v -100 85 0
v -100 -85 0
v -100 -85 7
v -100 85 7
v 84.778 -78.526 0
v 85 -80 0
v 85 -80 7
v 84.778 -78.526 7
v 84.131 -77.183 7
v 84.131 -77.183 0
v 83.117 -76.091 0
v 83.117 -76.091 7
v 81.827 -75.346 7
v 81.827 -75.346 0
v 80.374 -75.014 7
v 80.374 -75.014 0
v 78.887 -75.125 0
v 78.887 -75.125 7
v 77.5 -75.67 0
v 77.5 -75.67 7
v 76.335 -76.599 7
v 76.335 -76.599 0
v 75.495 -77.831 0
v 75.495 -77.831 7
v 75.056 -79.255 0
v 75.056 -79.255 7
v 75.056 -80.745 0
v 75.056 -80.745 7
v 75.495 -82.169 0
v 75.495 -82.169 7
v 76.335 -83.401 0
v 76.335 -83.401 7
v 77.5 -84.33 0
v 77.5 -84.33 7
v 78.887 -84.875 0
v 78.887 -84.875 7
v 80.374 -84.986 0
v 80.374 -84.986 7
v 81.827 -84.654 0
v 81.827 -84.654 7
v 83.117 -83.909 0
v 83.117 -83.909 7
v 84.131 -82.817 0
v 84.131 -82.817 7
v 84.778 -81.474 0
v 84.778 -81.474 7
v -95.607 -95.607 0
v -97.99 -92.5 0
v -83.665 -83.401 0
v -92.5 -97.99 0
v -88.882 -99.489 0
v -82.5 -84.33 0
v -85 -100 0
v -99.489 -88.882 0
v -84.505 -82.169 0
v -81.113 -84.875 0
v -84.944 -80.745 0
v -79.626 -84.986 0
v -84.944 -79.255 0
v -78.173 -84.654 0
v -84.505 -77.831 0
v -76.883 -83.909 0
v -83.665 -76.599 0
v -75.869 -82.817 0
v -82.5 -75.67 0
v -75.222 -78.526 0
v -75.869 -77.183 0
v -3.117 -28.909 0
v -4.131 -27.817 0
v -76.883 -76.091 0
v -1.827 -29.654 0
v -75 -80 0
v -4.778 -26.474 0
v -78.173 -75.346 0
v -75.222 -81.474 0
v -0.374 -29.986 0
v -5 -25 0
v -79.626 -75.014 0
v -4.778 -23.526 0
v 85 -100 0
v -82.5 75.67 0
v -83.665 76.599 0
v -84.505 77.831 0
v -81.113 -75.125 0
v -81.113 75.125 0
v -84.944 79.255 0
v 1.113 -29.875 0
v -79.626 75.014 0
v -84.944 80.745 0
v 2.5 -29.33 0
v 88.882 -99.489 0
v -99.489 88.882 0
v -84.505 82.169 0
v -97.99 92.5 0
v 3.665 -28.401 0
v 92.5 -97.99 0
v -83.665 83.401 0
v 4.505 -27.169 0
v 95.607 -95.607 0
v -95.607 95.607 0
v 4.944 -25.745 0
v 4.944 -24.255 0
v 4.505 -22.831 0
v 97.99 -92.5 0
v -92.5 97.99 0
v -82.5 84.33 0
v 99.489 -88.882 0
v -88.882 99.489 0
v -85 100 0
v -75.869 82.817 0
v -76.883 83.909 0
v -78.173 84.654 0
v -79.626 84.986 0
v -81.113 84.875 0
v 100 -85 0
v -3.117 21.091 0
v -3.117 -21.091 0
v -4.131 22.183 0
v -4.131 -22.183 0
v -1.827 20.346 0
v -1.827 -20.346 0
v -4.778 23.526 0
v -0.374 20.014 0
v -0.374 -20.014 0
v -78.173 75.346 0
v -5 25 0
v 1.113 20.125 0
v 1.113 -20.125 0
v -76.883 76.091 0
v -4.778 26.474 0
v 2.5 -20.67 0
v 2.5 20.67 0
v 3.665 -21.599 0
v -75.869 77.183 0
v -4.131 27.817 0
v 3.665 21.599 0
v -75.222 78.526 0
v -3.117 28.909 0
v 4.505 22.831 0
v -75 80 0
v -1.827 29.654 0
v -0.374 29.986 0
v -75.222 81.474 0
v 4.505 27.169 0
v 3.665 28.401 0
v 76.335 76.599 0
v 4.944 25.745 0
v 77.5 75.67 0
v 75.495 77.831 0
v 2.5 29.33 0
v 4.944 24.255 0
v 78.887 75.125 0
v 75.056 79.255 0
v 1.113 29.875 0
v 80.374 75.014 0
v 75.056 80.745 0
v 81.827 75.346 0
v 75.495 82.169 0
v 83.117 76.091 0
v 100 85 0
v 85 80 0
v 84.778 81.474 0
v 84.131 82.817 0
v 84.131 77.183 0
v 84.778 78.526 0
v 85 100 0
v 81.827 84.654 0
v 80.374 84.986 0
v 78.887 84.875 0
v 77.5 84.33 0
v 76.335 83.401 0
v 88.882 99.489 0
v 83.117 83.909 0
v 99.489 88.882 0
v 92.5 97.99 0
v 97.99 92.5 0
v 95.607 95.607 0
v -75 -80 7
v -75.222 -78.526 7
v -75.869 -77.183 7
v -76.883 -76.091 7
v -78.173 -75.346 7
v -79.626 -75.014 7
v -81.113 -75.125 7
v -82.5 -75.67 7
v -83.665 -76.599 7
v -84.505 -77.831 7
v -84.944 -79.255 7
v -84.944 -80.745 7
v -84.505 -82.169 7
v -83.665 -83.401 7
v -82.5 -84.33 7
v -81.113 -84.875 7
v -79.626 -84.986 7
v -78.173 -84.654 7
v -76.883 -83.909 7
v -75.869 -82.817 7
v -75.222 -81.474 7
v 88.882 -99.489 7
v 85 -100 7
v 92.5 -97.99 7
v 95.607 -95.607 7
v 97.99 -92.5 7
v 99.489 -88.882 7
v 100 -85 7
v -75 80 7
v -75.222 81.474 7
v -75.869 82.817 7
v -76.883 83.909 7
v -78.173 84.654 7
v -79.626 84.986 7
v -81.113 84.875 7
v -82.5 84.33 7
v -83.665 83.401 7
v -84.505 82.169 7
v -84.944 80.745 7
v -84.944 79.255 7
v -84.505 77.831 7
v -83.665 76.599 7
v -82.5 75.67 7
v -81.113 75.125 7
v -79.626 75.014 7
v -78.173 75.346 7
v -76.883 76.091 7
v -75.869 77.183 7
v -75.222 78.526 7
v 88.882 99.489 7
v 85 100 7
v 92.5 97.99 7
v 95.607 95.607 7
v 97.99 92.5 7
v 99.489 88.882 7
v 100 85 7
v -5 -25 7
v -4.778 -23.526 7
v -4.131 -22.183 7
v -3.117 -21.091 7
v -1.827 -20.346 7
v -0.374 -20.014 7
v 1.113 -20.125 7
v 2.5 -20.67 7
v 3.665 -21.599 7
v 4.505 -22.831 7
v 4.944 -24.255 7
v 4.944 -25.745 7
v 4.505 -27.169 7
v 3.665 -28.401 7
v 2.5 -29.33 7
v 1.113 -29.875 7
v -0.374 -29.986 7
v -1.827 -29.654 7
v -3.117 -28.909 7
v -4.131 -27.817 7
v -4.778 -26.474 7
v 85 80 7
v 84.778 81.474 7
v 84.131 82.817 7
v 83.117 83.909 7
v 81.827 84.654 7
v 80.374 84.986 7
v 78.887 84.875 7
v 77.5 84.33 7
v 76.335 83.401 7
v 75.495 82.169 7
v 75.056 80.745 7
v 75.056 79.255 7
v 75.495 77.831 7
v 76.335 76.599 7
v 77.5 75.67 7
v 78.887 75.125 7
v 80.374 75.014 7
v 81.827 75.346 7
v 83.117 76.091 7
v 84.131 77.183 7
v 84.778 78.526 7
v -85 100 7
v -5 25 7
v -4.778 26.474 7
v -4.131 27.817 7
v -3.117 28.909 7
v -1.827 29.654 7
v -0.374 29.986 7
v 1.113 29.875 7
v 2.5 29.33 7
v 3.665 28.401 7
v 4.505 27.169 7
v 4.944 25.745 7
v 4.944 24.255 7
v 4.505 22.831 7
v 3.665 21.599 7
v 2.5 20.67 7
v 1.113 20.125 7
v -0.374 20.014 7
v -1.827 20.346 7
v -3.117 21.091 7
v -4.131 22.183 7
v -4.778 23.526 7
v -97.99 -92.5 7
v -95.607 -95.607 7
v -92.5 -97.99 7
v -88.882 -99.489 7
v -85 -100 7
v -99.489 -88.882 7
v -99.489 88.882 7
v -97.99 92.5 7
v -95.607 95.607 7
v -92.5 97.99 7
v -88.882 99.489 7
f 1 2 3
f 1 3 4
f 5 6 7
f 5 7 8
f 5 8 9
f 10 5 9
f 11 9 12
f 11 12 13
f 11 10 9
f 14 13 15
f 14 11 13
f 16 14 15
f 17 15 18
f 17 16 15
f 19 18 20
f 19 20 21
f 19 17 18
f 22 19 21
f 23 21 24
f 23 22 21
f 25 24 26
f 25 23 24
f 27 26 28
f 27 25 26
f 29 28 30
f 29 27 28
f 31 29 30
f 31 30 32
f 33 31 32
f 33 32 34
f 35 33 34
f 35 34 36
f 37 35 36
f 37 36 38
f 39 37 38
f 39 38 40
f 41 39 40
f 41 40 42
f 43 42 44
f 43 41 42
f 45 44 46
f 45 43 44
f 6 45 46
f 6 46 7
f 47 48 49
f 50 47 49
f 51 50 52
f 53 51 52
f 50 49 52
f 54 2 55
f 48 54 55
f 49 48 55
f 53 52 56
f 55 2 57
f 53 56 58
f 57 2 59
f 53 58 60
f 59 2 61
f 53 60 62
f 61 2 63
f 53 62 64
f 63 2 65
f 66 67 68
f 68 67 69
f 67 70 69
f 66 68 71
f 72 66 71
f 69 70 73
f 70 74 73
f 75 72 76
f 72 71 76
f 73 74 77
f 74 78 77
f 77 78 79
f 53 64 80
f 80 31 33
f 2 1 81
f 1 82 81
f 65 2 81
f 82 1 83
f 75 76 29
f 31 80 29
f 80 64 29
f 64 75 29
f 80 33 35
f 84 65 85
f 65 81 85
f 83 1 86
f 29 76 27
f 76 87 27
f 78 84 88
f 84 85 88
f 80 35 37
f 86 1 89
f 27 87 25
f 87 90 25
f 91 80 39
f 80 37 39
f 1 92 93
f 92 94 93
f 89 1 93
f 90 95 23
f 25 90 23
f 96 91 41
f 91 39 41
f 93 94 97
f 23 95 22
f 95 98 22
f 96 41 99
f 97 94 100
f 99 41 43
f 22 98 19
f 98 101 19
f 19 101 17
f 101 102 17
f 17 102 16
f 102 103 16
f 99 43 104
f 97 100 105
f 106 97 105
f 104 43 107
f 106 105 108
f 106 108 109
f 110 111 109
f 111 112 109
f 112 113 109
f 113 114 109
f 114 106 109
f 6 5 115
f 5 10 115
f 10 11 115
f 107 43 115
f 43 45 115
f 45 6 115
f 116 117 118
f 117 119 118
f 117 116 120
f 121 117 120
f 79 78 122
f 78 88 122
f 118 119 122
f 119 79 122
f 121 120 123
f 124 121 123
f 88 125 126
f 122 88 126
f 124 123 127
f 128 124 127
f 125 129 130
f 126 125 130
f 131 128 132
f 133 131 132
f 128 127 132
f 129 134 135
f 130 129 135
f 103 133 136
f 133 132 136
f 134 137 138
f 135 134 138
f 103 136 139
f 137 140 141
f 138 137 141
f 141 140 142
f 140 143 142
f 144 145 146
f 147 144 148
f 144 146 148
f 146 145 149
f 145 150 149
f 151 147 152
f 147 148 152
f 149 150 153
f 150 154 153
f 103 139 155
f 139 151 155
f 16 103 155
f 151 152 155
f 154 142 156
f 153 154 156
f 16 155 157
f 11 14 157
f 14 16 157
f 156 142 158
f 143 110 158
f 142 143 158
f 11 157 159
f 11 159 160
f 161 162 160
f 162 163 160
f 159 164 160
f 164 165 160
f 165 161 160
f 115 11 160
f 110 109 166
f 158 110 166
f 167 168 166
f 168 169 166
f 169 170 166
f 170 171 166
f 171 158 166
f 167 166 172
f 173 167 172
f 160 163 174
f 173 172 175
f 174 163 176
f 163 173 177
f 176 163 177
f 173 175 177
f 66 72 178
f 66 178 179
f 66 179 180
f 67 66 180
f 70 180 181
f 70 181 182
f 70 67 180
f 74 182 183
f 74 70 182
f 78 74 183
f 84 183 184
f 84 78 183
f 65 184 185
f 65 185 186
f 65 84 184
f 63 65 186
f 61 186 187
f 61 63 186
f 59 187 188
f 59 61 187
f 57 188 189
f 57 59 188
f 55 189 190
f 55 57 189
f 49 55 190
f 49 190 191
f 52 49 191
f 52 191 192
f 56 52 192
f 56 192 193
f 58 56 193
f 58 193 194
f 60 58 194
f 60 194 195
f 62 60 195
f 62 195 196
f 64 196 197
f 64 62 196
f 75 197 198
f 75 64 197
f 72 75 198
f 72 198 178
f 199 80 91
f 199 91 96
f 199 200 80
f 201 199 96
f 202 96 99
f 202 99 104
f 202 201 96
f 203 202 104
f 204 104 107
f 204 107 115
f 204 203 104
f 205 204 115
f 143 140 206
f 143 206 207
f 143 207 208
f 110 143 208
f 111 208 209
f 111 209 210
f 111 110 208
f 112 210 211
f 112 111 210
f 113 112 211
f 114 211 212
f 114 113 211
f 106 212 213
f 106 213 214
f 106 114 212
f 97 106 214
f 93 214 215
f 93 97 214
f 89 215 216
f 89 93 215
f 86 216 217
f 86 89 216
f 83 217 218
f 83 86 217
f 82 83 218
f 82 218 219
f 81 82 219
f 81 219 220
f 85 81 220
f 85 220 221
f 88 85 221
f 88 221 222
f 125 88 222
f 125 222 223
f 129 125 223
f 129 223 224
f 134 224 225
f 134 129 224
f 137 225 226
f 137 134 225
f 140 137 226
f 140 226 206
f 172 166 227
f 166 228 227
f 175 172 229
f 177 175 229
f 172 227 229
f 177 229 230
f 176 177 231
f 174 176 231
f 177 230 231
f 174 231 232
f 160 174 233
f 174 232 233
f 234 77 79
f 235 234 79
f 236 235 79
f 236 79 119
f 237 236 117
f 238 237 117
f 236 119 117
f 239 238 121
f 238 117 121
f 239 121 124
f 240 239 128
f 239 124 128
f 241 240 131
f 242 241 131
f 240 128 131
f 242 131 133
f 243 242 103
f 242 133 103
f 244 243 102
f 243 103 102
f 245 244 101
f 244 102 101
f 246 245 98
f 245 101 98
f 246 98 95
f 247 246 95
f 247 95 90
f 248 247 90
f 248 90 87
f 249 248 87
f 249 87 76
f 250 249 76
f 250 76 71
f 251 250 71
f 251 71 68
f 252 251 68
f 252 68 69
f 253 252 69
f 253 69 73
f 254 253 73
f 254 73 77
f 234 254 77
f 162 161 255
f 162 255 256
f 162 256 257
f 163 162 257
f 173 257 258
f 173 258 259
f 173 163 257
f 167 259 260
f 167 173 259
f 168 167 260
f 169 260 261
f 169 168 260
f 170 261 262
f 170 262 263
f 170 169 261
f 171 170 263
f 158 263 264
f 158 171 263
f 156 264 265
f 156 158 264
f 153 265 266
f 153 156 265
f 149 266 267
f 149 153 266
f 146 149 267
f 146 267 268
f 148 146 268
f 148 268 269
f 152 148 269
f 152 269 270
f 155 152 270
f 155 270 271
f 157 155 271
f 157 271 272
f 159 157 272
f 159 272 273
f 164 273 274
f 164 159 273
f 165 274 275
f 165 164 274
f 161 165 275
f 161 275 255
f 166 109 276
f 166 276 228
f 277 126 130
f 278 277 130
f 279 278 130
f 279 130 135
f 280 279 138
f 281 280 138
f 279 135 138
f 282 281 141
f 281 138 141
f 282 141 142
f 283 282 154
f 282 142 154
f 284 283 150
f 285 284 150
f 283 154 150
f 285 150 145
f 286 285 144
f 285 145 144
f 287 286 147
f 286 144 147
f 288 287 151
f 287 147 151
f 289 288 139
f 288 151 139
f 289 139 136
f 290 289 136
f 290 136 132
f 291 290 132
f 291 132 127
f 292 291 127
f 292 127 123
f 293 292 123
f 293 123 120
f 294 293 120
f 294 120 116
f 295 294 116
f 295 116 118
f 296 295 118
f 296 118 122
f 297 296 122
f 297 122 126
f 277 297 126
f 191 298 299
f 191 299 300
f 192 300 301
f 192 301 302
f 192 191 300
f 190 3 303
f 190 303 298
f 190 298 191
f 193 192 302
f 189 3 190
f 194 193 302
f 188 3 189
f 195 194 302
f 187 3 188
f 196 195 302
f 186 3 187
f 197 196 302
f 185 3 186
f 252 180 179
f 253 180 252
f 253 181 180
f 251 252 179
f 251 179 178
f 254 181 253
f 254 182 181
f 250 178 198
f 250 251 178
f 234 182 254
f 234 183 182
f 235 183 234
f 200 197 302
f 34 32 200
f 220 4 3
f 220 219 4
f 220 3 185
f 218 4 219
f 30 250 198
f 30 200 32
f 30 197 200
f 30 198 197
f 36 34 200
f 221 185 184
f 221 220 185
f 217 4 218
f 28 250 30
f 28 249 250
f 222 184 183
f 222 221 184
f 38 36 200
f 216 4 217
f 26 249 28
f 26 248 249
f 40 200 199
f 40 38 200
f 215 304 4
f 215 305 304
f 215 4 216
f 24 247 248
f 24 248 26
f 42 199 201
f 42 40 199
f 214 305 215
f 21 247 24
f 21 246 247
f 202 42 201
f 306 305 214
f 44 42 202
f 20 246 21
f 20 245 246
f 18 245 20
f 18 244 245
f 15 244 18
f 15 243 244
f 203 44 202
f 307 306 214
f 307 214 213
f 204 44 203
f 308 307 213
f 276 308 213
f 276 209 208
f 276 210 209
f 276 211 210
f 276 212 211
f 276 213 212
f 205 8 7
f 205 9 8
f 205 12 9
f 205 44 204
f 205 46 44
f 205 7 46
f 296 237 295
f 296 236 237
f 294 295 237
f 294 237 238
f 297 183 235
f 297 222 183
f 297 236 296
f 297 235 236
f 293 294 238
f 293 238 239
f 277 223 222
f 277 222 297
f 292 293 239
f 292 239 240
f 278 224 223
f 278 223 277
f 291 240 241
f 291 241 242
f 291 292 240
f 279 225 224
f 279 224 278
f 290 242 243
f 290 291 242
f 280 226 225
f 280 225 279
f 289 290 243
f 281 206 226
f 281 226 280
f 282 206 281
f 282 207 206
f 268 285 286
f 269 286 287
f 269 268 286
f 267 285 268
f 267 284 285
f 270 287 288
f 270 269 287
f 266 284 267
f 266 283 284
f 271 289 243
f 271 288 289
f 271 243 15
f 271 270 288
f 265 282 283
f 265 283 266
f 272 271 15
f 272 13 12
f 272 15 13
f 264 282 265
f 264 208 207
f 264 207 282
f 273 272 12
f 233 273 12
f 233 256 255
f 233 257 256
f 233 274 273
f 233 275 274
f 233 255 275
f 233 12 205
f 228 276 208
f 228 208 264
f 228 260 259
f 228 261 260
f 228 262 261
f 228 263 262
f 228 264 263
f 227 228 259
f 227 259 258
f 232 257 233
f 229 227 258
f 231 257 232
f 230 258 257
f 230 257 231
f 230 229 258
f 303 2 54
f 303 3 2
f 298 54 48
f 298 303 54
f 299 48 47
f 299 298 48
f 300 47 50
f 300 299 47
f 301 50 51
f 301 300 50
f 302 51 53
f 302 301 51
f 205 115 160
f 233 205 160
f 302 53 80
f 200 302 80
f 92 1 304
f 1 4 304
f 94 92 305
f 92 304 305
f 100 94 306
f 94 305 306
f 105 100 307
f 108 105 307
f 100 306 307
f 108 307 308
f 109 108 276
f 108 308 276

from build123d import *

# Parameters (mm, degrees)
ESQUISSE3_W             = 200
ESQUISSE3_H             = 200
ESQUISSE3_R             = 5
BOSS_EXTRU_2_DEPTH      = 7
CONG_1_R                = 15
ESQUISSE4_R             = 5
ENL_V_MAT_EXTRU_1_DEPTH = 10


with BuildPart() as part:
    # Esquisse3 → Boss.-Extru.2 (new body)
    with BuildSketch(Plane.XY):
        Rectangle(ESQUISSE3_W, ESQUISSE3_H)
        with Locations((80, 80)):
            Circle(ESQUISSE3_R, mode=Mode.SUBTRACT)
        with Locations((80, -80)):
            Circle(ESQUISSE3_R, mode=Mode.SUBTRACT)
        with Locations((-80, -80)):
            Circle(ESQUISSE3_R, mode=Mode.SUBTRACT)
        with Locations((-80, 80)):
            Circle(ESQUISSE3_R, mode=Mode.SUBTRACT)
    extrude(amount=BOSS_EXTRU_2_DEPTH)

    # Congé1
    cong_1_edges = [part.edges().sort_by_distance(p)[0] for p in [
        (-100, 100, 3.5),
        (100, 100, 3.5),
        (100, -100, 3.5),
        (-100, -100, 3.5),
    ]]
    fillet(cong_1_edges, radius=CONG_1_R)

    # Esquisse4 → Enlèv. mat.-Extru.1 (cut)
    with BuildSketch(Plane(origin=(0, 0, 0), x_dir=(-1, 0, 0), z_dir=(0, 0, -1))):
        with Locations((0, -25)):
            Circle(ESQUISSE4_R)
        with Locations((0, 25)):
            Circle(ESQUISSE4_R)
    extrude(amount=-ENL_V_MAT_EXTRU_1_DEPTH, mode=Mode.SUBTRACT)


solid = part.part
